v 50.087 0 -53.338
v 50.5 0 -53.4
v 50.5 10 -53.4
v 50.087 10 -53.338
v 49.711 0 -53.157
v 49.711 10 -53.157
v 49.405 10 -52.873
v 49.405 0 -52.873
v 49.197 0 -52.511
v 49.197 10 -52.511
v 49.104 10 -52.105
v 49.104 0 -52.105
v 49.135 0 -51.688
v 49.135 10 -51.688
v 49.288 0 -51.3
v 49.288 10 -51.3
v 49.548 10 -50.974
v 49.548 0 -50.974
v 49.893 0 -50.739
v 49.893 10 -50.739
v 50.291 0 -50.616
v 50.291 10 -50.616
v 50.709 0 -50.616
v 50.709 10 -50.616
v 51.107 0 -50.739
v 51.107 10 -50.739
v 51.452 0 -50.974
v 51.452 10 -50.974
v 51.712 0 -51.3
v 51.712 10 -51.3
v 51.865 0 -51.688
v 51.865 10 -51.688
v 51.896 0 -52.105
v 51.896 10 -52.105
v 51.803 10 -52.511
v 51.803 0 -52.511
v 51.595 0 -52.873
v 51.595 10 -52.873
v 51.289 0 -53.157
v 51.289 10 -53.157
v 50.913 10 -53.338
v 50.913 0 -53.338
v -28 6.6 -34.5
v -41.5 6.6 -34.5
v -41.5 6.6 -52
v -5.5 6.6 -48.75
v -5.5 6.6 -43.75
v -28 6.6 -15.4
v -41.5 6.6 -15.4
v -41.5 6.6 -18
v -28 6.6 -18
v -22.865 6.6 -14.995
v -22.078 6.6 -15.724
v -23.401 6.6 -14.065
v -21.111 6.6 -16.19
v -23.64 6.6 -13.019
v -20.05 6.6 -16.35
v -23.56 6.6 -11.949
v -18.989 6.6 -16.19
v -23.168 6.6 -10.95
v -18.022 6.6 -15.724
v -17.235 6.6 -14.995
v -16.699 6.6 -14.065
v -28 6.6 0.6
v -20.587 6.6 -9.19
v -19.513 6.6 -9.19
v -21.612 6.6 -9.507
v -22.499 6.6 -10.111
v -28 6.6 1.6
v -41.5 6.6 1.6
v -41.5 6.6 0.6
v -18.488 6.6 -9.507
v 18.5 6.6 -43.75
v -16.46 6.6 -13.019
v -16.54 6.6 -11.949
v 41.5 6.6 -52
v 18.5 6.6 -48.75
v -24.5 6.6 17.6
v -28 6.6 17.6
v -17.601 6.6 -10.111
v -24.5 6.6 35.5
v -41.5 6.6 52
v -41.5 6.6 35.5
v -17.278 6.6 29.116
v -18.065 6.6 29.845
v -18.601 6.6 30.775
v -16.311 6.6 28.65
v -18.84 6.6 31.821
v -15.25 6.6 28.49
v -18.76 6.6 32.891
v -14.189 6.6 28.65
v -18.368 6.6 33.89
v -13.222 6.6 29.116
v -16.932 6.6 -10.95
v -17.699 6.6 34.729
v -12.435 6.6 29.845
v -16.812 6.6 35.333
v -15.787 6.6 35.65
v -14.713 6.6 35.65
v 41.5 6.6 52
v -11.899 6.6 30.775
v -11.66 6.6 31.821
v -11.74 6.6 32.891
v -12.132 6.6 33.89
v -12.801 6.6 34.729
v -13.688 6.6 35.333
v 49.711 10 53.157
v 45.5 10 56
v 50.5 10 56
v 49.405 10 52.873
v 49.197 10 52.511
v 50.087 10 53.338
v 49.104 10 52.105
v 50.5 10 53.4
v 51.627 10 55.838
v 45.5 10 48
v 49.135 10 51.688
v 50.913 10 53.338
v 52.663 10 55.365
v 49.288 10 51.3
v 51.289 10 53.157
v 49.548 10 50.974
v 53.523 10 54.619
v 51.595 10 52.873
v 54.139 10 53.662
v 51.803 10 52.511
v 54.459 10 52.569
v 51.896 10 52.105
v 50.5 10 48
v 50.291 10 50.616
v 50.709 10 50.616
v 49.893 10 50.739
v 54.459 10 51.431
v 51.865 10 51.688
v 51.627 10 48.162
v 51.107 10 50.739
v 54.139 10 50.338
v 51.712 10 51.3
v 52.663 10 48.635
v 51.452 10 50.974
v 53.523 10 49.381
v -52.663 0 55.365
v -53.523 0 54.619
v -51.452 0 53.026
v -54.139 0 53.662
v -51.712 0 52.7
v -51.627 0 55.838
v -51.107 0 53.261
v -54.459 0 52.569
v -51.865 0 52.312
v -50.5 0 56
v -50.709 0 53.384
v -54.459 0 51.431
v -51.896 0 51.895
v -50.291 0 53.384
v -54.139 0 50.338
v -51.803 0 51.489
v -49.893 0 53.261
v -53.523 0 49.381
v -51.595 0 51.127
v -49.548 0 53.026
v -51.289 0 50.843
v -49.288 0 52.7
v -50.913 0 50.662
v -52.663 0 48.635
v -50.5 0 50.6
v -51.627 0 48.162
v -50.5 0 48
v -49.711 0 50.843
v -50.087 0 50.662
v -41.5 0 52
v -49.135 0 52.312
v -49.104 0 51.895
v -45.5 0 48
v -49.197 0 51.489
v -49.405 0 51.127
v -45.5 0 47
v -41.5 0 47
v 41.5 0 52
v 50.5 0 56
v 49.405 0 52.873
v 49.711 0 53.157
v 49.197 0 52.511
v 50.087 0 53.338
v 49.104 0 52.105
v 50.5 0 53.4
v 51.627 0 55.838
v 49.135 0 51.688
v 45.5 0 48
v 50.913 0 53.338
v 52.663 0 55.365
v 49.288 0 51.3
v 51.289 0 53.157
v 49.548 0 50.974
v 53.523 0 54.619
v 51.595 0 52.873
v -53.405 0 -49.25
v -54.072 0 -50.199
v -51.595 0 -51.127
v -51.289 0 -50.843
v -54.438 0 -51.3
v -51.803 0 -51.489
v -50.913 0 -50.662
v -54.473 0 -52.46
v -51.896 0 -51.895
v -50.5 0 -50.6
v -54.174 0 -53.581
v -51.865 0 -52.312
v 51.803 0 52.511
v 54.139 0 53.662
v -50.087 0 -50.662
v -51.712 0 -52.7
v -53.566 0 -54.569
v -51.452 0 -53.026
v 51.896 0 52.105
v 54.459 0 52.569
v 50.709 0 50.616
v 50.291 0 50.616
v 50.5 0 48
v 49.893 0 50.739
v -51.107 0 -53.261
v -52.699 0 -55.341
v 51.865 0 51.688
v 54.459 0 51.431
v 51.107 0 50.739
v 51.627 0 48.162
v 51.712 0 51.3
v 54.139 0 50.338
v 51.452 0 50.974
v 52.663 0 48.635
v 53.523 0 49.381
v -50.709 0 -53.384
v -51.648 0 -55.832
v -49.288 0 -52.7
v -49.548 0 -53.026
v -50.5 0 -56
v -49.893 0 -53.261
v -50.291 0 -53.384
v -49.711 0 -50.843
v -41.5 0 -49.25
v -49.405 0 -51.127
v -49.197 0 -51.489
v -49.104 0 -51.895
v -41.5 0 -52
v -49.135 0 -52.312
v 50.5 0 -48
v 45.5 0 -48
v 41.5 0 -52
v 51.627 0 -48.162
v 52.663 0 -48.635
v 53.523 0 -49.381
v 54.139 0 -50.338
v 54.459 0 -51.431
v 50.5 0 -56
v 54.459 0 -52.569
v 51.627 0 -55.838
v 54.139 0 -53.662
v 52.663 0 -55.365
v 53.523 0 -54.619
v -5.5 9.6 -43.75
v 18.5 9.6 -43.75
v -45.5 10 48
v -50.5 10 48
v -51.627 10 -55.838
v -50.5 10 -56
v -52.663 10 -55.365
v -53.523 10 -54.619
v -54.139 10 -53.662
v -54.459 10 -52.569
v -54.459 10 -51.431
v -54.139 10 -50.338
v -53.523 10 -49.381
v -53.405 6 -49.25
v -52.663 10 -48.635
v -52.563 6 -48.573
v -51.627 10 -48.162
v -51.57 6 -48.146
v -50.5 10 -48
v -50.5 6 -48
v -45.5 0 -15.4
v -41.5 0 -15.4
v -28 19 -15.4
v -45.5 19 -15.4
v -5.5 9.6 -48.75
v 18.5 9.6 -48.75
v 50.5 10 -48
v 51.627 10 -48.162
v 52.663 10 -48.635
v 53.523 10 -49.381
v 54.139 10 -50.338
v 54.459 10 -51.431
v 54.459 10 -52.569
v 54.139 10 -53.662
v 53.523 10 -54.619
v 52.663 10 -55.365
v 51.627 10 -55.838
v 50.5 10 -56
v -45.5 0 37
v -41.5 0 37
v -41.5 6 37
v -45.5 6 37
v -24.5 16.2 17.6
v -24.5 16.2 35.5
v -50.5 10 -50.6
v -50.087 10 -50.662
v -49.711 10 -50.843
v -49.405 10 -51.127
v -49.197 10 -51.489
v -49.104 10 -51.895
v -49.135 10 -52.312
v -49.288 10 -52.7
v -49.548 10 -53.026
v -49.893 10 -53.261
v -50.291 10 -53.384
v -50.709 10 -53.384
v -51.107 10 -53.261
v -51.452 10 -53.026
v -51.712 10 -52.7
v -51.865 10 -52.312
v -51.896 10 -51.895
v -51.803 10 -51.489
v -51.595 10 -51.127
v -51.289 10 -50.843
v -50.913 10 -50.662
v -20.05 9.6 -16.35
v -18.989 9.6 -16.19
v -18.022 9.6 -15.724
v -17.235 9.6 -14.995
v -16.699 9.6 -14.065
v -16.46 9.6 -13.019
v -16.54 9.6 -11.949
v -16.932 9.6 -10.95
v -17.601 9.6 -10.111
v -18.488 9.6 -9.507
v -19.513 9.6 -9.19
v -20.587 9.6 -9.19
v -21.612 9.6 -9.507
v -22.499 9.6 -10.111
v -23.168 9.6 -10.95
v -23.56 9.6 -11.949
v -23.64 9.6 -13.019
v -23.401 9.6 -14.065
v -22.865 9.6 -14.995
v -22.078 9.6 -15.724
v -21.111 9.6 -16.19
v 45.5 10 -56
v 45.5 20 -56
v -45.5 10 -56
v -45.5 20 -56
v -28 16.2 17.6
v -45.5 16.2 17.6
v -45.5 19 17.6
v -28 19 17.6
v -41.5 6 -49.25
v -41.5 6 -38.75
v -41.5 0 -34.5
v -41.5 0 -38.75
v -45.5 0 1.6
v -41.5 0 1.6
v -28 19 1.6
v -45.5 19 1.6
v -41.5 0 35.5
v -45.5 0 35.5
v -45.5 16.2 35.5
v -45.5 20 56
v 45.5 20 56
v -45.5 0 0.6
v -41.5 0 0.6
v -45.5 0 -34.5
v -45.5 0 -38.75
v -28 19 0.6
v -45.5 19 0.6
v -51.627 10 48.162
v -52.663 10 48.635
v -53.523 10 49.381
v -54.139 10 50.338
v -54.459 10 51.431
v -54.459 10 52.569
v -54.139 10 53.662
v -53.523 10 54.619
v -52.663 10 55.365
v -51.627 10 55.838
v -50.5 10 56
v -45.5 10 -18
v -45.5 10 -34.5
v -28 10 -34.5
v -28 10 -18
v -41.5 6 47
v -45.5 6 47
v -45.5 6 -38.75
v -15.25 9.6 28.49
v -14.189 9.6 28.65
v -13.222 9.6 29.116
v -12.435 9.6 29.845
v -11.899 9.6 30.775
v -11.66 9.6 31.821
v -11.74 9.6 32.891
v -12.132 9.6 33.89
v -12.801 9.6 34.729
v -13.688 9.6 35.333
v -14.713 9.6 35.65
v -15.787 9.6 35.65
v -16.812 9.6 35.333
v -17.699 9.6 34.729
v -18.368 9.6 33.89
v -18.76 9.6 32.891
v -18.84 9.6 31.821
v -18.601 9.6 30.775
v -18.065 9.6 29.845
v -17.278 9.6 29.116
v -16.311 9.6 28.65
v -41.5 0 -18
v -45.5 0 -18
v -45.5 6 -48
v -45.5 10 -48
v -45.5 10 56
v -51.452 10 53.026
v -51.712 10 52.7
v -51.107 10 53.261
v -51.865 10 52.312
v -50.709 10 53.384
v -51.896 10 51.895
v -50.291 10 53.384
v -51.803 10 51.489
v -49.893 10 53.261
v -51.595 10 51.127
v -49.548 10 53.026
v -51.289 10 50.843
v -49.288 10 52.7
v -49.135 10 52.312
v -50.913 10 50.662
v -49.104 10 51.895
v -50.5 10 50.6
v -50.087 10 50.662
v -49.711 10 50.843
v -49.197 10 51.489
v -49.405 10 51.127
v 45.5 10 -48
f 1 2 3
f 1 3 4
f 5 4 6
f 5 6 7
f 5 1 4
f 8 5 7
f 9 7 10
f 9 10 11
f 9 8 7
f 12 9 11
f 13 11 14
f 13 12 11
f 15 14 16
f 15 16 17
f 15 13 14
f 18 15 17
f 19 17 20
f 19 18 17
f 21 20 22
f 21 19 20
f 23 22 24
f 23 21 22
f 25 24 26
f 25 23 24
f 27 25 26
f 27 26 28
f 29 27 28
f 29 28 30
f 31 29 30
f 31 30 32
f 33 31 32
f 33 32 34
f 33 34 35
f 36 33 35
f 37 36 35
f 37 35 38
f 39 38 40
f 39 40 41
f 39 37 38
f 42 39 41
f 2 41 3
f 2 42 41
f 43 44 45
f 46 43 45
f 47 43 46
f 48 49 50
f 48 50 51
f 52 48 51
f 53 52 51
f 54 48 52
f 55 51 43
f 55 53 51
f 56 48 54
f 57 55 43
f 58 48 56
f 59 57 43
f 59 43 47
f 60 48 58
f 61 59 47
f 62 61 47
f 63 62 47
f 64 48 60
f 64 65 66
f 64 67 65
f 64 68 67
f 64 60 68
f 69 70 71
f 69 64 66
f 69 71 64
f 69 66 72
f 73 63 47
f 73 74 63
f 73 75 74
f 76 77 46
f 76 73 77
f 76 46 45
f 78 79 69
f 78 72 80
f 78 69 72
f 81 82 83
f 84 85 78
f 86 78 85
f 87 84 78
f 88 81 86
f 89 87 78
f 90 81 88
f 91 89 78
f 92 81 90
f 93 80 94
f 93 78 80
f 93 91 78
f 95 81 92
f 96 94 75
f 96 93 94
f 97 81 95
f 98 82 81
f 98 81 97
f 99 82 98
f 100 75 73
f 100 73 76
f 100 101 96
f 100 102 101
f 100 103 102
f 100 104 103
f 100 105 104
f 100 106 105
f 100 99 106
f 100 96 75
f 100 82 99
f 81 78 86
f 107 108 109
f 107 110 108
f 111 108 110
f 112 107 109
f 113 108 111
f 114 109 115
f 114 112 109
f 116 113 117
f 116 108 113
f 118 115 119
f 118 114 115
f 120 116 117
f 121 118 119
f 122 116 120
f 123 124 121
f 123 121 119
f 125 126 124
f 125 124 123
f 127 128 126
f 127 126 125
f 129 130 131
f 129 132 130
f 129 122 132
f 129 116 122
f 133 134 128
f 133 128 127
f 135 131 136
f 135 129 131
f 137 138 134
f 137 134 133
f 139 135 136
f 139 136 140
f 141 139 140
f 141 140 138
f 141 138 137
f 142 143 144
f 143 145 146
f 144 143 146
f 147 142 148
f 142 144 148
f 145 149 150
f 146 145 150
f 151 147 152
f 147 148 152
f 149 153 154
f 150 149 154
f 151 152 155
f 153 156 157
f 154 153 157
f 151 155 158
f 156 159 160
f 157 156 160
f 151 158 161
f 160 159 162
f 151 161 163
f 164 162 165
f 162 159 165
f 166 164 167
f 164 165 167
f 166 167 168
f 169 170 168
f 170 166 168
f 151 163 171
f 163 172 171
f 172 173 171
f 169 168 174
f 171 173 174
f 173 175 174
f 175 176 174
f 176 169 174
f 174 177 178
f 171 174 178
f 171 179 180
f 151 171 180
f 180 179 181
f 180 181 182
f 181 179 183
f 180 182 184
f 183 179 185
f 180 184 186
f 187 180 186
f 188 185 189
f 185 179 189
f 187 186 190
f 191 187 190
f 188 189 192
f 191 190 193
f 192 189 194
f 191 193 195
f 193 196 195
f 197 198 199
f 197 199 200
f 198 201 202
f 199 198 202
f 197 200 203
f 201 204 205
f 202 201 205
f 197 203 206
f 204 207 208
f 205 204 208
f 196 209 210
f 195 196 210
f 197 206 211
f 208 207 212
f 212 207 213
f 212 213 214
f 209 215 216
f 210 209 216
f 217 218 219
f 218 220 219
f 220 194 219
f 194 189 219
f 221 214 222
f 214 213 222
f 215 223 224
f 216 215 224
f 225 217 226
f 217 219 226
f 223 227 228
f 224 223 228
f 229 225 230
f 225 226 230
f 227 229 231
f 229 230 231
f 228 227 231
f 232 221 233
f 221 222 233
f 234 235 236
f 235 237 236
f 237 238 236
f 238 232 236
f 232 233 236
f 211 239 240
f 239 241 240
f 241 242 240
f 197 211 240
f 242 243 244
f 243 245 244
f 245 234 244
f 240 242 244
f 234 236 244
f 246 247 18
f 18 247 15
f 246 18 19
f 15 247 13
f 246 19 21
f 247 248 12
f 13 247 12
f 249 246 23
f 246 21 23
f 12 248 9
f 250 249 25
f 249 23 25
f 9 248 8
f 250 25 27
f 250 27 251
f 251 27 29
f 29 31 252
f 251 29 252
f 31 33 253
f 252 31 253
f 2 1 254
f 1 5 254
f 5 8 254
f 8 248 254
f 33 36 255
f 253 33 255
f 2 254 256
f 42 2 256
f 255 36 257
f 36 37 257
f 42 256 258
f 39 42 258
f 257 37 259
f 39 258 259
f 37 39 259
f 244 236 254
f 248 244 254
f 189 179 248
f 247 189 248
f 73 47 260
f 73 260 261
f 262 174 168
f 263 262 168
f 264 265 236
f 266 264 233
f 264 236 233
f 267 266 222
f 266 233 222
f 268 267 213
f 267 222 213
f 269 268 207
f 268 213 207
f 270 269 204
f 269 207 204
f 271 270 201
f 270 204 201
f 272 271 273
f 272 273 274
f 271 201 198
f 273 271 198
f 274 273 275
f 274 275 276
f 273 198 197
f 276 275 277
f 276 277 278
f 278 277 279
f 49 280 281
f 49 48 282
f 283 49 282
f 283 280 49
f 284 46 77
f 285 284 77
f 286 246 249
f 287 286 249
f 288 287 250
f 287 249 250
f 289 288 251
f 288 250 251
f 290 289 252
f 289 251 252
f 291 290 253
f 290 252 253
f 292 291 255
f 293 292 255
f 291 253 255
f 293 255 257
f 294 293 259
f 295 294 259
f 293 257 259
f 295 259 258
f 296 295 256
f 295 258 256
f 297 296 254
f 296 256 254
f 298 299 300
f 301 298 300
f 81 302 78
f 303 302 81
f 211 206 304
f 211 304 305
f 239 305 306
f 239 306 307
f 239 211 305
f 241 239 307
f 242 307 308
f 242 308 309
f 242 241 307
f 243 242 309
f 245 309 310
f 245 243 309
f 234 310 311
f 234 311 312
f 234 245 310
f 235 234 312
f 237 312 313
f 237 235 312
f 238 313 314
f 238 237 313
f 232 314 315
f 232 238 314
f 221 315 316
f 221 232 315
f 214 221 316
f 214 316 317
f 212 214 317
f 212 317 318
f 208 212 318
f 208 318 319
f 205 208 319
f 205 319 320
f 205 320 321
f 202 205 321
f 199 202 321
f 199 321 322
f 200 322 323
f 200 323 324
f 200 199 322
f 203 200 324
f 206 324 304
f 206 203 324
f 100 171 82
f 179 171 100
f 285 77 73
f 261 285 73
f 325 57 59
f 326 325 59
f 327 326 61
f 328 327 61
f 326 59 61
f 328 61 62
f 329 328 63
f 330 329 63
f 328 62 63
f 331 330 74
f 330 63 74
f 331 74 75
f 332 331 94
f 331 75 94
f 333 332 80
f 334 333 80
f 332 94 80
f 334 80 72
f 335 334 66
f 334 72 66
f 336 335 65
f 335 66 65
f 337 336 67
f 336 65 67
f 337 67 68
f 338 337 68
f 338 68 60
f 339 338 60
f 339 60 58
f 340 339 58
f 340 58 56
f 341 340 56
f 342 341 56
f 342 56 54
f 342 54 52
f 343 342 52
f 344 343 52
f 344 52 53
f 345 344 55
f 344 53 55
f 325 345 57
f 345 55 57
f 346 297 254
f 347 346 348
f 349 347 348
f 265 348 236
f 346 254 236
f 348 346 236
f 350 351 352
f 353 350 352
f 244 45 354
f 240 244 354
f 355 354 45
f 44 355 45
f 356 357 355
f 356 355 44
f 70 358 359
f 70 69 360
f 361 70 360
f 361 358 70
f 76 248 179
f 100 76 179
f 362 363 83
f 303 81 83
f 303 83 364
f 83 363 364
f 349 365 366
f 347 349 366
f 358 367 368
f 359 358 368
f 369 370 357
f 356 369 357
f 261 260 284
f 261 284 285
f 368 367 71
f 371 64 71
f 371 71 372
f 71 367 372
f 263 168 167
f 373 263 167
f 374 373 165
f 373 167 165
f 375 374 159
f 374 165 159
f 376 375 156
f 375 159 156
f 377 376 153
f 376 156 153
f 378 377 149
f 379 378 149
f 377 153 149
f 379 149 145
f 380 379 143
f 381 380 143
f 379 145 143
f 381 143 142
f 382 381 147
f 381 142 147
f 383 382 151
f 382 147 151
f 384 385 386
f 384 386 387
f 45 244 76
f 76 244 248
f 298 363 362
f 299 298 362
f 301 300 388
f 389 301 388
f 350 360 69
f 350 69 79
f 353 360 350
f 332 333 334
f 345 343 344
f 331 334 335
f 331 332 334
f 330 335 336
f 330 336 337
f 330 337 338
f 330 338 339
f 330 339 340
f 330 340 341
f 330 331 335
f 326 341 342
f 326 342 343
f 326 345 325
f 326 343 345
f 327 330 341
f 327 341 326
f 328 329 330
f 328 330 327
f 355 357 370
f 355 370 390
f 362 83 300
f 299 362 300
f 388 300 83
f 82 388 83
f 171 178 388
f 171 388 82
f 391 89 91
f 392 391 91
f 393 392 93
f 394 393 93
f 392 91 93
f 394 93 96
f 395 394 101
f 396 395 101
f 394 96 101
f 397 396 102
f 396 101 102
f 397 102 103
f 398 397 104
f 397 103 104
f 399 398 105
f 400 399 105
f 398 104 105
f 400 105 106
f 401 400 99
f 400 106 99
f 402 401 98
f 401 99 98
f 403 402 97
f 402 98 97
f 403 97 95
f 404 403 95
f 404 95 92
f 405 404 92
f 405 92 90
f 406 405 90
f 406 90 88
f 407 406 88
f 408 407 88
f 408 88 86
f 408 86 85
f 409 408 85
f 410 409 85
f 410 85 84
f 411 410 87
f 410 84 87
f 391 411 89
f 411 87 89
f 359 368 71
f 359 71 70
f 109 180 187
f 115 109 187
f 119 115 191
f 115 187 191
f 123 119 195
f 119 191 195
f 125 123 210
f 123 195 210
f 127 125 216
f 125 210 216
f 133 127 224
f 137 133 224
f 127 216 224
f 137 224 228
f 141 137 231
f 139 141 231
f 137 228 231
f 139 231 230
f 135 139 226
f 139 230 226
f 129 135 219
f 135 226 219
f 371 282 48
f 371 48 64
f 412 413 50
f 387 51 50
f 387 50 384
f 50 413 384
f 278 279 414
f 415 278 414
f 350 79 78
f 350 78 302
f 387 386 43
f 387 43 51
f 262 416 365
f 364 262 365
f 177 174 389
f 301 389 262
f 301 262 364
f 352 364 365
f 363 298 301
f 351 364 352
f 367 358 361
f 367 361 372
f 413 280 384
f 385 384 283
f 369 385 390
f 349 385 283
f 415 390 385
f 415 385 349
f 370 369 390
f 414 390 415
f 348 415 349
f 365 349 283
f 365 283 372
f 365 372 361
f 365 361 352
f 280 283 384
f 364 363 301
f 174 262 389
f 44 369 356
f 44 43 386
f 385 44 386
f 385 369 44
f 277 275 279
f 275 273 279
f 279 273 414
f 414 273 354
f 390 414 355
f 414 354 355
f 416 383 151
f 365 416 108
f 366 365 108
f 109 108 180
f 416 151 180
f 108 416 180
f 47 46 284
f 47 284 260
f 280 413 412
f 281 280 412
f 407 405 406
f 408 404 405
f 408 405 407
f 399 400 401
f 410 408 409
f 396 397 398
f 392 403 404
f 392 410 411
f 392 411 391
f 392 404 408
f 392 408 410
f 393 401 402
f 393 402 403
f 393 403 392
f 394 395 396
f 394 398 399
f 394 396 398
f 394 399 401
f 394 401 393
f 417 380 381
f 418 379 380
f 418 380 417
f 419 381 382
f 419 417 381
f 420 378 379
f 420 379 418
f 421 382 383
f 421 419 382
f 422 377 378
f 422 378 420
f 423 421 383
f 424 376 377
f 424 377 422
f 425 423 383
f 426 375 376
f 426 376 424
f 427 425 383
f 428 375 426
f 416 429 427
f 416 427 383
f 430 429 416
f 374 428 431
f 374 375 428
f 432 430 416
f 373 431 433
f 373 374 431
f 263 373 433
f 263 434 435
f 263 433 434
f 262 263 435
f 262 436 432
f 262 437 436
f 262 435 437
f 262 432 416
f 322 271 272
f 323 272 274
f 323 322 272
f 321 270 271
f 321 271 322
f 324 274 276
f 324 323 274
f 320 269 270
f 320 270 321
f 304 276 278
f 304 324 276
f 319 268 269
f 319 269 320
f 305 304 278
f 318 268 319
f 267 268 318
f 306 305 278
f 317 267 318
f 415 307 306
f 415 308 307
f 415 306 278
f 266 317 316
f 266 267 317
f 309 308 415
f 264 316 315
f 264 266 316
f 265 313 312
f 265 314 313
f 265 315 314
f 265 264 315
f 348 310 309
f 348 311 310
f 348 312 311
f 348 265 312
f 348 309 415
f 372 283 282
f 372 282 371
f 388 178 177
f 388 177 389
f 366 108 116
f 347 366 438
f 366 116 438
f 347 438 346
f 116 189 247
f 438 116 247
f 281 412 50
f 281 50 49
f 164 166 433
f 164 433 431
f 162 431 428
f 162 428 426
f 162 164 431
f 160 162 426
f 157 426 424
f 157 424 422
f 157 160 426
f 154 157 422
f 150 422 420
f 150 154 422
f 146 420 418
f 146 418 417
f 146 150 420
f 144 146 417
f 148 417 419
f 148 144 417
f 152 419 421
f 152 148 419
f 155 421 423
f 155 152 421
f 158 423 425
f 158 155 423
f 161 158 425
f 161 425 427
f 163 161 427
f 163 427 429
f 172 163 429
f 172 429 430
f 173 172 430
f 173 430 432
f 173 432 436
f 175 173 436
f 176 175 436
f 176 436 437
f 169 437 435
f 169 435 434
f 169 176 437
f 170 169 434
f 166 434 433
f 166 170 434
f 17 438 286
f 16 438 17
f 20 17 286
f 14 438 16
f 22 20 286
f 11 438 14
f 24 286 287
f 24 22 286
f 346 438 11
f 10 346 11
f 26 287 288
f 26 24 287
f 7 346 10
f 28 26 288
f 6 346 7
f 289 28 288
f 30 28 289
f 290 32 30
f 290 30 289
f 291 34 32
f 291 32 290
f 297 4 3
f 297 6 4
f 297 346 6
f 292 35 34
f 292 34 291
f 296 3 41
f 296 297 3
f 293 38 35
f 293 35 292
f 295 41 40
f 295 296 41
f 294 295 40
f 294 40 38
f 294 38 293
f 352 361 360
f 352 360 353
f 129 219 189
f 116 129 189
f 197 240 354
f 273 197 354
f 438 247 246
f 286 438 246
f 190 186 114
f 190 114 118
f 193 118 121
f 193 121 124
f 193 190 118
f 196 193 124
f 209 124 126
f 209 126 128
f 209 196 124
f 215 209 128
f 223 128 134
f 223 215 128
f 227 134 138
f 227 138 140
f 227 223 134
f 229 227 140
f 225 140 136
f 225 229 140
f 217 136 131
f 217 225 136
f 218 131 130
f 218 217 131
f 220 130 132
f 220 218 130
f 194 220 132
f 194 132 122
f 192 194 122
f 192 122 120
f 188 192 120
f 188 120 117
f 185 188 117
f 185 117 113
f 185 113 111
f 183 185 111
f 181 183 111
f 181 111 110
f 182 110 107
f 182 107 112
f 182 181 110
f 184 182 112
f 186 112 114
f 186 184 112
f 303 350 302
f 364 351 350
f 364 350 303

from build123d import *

# Parameters (mm, degrees)
SKETCH1_W                            = 91
SKETCH1_H                            = 112
BASE_DEPTH                           = 20
SKETCH2_R                            = 1.4
CASE_ASSEMBLY_HOLES_DEPTH            = 10
SKETCH3_W                            = 83
SKETCH3_H                            = 104
MODULE_CUTOUT_DEPTH                  = 6.6
USB_C_AND_MICRO_USB_SLOTS_DEPTH      = 117.344316578
USB_C_AND_MICRO_USB_SLOTS_DEPTH_BACK = 7
SKETCH4_W                            = 10.5
SKETCH4_H                            = 6
SKETCH4_W_2                          = 10
SKETCH5_W                            = 16.5
SKETCH5_H                            = 10
SKETCH5_W_2                          = 16
SKETCH5_H_2                          = 19
HDMI_AND_USB_SLOTS_DEPTH             = 17.5
SKETCH6_W                            = 17.9
SKETCH6_H                            = 16.2
ETHERNET_SLOT_DEPTH                  = 21
SKETCH7_R                            = 3.6
SKETCH7_W                            = 24
SKETCH7_H                            = 5
TALL_COMPONENTS_CUTOUTS_DEPTH        = 3


with BuildPart() as part:
    # Sketch1 → Base (new body)
    with BuildSketch(Plane(origin=(0, 0, 0), x_dir=(1, 0, 0), z_dir=(0, 1, 0))):
        Rectangle(SKETCH1_W, SKETCH1_H)
    extrude(amount=BASE_DEPTH)

    # Sketch2 → Case Assembly Holes (add)
    # profile 1 of 4: a face of its own
    with BuildSketch(Plane(origin=(0, 0, 0), x_dir=(1, 0, 0), z_dir=(0, 1, 0))):
        with BuildLine():
            Line((-45.5, 56), (-50.5, 56))
            ThreePointArc((-50.5, 56), (-54.5, 52), (-50.5, 48))
            Line((-50.5, 48), (-45.5, 48))
            Line((-45.5, 48), (-45.5, 56))
        make_face()
        with Locations(Location((-50.5, 52, 0), (0, 0, 270))):
            Circle(SKETCH2_R, mode=Mode.SUBTRACT)
    # profile 2 of 4: a face of its own
    with BuildSketch(Plane(origin=(0, 0, 0), x_dir=(1, 0, 0), z_dir=(0, 1, 0))):
        with BuildLine():
            Line((45.5, 48), (50.5, 48))
            ThreePointArc((50.5, 48), (54.5, 52), (50.5, 56))
            Line((50.5, 56), (45.5, 56))
            Line((45.5, 56), (45.5, 48))
        make_face()
        with Locations(Location((50.5, 52, 0), (0, 0, 90))):
            Circle(SKETCH2_R, mode=Mode.SUBTRACT)
    # profile 3 of 4: a face of its own
    with BuildSketch(Plane(origin=(0, 0, 0), x_dir=(1, 0, 0), z_dir=(0, 1, 0))):
        with BuildLine():
            Line((45.5, -56), (50.5, -56))
            ThreePointArc((50.5, -56), (54.5, -52), (50.5, -48))
            Line((50.5, -48), (45.5, -48))
            Line((45.5, -48), (45.5, -56))
        make_face()
        with Locations(Location((50.5, -52, 0), (0, 0, 270))):
            Circle(SKETCH2_R, mode=Mode.SUBTRACT)
    # profile 4 of 4: a face of its own
    with BuildSketch(Plane(origin=(0, 0, 0), x_dir=(1, 0, 0), z_dir=(0, 1, 0))):
        with BuildLine():
            Line((-45.5, -48), (-50.5, -48))
            ThreePointArc((-50.5, -48), (-54.5, -52), (-50.5, -56))
            Line((-50.5, -56), (-45.5, -56))
            Line((-45.5, -56), (-45.5, -48))
        make_face()
        with Locations(Location((-50.5, -52, 0), (0, 0, 90))):
            Circle(SKETCH2_R, mode=Mode.SUBTRACT)
    extrude(amount=CASE_ASSEMBLY_HOLES_DEPTH)

    # Sketch3 → Module Cutout (cut)
    with BuildSketch(Plane.XZ):
        Rectangle(SKETCH3_W, SKETCH3_H)
    extrude(amount=-MODULE_CUTOUT_DEPTH, mode=Mode.SUBTRACT)

    # Sketch4 → USB-C and Micro-USB Slots (cut, two sides: drawn at the far end of the back side and taken through both)
    with BuildSketch(Plane.ZY.offset(45.5).offset(-USB_C_AND_MICRO_USB_SLOTS_DEPTH_BACK)):
        with Locations((-44, 3)):
            Rectangle(SKETCH4_W, SKETCH4_H)
        with Locations((42, 3)):
            Rectangle(SKETCH4_W_2, SKETCH4_H)
    extrude(amount=USB_C_AND_MICRO_USB_SLOTS_DEPTH + USB_C_AND_MICRO_USB_SLOTS_DEPTH_BACK, mode=Mode.SUBTRACT)

    # Sketch5 → HDMI and USB Slots (cut)
    with BuildSketch(Plane.ZY.offset(45.5)):
        with Locations((-26.25, 5)):
            Rectangle(SKETCH5_W, SKETCH5_H)
        with Locations((-7.4, 9.5)):
            Rectangle(SKETCH5_W_2, SKETCH5_H_2)
        with Locations((9.6, 9.5)):
            Rectangle(SKETCH5_W_2, SKETCH5_H_2)
    extrude(amount=-HDMI_AND_USB_SLOTS_DEPTH, mode=Mode.SUBTRACT)

    # Sketch6 → Ethernet Slot (cut)
    with BuildSketch(Plane.ZY.offset(45.5)):
        with Locations((26.55, 8.1)):
            Rectangle(SKETCH6_W, SKETCH6_H)
    extrude(amount=-ETHERNET_SLOT_DEPTH, mode=Mode.SUBTRACT)

    # Sketch7 → Tall Components Cutouts (cut)
    with BuildSketch(Plane.XZ.offset(-6.6)):
        with Locations(Location((-20.05, -12.75, 0), (0, 0, 270))):
            Circle(SKETCH7_R)
        with Locations(Location((-15.25, 32.09, 0), (0, 0, 270))):
            Circle(SKETCH7_R)
        with Locations((6.5, -46.25)):
            Rectangle(SKETCH7_W, SKETCH7_H)
    extrude(amount=-TALL_COMPONENTS_CUTOUTS_DEPTH, mode=Mode.SUBTRACT)


solid = part.part
